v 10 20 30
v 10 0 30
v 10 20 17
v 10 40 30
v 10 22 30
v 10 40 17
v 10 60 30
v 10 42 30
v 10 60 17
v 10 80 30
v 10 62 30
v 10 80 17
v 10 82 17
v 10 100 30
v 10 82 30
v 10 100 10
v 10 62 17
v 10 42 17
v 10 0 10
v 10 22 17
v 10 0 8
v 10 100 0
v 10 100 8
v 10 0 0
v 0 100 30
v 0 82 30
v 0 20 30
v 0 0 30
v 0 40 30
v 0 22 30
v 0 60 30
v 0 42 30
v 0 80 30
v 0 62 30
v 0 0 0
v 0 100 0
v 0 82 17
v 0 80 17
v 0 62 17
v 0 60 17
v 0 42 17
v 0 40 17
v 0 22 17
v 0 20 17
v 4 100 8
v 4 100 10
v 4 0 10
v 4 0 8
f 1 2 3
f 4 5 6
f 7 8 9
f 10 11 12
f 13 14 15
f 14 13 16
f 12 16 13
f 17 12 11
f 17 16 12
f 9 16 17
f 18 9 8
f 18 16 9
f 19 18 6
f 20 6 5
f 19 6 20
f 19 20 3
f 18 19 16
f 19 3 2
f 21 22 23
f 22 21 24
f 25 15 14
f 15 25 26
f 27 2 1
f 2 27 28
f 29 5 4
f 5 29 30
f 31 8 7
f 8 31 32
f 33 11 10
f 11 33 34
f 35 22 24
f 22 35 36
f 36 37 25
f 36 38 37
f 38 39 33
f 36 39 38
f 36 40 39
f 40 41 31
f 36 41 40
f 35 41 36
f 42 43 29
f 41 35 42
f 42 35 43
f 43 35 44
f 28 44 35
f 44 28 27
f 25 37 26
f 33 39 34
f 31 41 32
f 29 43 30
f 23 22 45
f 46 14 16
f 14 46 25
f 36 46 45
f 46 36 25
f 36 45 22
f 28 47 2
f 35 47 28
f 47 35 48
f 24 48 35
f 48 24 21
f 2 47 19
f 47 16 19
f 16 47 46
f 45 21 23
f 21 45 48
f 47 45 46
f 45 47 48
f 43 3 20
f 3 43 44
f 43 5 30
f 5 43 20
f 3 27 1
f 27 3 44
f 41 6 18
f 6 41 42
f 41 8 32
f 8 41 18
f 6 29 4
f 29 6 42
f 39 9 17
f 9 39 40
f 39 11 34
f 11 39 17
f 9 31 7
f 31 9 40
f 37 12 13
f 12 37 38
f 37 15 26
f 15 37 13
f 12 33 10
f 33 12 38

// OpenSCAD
module centerplate(){
difference(){
	//main block
	cube([10,100,30]);
	//einschub fuer PCB
	translate([4,-1,8]){
		cube([9,110,2]);
	}
	//port0
	translate([-1,20,17]){
		cube([18,2,20]);
	}
	//port1
	translate([-1,40,17]){
		cube([18,2,20]);
	}
	//port2
	translate([-1,60,17]){
		cube([18,2,20]);
	}
	//port3
	translate([-1,80,17]){
		cube([18,2,20]);
	}
}
}

//uncomment this to generate a better printable STL
//rotate([0,270,0]){
	centerplate();
//}
